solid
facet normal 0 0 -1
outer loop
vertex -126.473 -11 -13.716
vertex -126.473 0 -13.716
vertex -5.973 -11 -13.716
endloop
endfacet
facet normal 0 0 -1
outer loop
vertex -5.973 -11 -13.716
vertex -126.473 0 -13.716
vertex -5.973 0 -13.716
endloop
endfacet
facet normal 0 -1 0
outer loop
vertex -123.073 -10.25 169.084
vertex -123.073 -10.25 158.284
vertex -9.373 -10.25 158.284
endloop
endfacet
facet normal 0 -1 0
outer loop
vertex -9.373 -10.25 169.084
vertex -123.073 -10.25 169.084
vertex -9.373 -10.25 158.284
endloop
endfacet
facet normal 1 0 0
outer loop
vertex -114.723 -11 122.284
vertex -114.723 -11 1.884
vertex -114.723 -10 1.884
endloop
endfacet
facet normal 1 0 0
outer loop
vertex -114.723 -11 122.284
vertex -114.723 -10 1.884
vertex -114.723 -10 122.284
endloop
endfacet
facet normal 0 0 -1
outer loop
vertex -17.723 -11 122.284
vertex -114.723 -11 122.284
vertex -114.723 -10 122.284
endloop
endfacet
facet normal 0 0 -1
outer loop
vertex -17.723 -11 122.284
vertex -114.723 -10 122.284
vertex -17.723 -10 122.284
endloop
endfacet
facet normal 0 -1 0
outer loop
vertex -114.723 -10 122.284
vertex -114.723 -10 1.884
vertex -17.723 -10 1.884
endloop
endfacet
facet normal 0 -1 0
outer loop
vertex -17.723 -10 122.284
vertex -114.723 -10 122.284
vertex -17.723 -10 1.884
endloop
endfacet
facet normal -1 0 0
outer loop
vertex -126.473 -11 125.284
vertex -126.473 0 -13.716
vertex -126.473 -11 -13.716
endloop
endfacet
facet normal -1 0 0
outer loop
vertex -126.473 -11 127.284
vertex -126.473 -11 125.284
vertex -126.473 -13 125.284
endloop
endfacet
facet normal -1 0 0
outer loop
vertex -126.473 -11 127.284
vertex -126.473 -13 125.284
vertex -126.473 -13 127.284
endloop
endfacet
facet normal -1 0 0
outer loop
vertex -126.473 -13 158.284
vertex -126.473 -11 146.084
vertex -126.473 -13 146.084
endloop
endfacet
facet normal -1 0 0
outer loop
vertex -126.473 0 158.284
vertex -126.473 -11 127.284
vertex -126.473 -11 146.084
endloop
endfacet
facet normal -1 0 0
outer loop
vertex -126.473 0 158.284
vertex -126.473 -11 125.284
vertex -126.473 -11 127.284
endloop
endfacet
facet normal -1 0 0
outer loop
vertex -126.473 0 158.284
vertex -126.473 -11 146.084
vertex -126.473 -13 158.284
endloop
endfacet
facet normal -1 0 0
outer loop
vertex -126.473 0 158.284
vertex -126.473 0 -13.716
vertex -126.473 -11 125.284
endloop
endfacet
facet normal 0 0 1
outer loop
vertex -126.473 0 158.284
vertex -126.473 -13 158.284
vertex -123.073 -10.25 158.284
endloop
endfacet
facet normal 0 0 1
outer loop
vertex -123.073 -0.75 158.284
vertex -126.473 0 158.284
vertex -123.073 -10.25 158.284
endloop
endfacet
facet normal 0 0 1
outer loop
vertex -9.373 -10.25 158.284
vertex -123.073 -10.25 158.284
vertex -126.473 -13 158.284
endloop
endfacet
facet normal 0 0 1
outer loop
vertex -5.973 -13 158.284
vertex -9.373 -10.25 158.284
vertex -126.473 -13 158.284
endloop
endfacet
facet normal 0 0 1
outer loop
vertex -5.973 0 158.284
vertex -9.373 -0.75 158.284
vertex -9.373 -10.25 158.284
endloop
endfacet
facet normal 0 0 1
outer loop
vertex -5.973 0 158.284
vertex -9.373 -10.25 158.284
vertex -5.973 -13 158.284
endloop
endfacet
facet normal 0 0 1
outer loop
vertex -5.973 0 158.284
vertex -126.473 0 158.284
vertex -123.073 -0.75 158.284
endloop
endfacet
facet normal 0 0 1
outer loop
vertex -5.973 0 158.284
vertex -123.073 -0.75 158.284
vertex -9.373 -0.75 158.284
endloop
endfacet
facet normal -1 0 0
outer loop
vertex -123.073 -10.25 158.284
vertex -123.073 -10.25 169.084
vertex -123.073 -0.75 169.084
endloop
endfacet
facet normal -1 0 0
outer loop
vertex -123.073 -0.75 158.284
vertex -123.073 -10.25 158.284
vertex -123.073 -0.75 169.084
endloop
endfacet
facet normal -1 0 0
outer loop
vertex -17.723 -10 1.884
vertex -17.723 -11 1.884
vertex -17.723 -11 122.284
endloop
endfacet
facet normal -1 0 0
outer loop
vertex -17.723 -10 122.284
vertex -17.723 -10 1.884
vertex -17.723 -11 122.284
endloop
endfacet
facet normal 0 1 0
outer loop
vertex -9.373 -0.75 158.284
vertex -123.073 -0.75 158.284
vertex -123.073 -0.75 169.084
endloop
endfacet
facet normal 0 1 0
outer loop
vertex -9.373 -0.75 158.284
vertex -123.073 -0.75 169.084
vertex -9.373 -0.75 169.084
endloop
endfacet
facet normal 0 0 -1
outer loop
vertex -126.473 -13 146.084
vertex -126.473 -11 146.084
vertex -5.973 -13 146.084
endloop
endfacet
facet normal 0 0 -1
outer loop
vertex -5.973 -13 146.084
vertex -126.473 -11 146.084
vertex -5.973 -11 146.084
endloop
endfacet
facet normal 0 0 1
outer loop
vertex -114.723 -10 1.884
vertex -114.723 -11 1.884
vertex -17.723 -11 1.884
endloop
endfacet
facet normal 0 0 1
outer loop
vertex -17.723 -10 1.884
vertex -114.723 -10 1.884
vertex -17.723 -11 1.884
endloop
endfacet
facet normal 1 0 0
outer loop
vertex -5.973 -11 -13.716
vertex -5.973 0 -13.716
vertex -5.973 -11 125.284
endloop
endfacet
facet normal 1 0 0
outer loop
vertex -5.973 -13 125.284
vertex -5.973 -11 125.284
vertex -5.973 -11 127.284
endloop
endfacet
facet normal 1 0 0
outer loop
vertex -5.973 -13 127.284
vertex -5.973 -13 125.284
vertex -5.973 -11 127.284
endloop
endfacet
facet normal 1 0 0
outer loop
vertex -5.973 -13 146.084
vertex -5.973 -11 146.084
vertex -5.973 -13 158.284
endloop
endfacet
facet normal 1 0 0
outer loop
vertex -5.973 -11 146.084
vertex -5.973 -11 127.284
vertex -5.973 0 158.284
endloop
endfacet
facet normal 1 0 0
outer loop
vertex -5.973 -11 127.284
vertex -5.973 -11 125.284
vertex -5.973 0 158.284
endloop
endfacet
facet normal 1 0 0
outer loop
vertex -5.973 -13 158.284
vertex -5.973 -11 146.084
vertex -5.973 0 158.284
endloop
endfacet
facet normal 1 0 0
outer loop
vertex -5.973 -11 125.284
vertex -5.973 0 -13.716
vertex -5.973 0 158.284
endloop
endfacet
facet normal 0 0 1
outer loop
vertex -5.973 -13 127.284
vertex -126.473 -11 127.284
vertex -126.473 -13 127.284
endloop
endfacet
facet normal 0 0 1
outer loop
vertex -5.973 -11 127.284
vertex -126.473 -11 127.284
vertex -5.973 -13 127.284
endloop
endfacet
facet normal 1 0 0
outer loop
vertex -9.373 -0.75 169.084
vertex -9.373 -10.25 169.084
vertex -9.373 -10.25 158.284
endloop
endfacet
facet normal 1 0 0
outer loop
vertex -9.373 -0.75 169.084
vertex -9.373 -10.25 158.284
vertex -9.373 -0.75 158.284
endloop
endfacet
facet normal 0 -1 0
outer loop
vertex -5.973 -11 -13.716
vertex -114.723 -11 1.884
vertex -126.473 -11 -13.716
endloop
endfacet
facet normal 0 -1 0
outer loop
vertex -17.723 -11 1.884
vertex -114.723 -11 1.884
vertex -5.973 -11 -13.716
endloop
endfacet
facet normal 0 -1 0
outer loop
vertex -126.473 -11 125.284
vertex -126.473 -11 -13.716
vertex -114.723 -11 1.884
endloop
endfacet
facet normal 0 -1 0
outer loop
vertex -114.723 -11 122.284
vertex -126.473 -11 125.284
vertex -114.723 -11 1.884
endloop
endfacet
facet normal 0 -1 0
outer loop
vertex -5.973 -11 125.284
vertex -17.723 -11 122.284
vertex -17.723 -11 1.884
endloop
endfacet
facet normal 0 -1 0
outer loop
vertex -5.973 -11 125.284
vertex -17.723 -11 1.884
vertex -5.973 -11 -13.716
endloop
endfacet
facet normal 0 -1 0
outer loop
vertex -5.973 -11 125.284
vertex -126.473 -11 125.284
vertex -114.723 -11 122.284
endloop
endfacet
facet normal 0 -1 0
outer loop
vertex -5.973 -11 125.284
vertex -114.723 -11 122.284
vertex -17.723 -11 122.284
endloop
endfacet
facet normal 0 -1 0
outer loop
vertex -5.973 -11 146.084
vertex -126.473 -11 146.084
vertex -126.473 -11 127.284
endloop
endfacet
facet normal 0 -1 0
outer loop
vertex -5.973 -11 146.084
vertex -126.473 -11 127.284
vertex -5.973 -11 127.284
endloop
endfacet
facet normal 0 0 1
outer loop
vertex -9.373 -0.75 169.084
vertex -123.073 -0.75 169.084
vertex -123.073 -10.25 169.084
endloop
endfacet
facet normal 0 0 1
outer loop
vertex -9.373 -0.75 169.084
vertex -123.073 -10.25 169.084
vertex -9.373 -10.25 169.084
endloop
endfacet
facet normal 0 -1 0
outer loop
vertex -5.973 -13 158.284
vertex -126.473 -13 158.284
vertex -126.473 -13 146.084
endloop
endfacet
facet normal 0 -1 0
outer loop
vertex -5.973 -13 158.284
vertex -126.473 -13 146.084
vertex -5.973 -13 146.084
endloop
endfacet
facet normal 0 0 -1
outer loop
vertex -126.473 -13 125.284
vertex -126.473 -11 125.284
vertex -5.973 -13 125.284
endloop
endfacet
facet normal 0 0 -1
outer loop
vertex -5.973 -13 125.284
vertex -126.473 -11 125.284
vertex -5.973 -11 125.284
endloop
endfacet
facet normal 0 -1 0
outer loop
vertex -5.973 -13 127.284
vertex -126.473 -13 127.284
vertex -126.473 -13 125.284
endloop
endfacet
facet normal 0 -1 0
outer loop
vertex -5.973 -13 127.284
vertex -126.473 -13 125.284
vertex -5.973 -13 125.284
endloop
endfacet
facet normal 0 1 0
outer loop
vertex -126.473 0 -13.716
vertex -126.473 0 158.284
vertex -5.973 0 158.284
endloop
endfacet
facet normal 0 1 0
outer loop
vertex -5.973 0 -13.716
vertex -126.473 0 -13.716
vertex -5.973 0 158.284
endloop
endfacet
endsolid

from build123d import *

# Parameters (mm, degrees)
F0_W     = 120.5
F0_H     = 172
F1_DEPTH = 11
F2_W     = 97
F2_H     = 120.4
F3_DEPTH = 1
F4_W     = 120.5
F4_H     = 2
F5_DEPTH = 2
F6_W     = 113.7
F6_H     = 9.5
F7_DEPTH = 10.8
F8_W     = 120.5
F8_H     = 12.2
F9_DEPTH = 2


with BuildPart() as f1:
    # F0 (on Front) → F1 (new body)
    with BuildSketch(Plane.XZ):
        with Locations((-66.222898, 72.284041)):
            Rectangle(F0_W, F0_H)
    extrude(amount=F1_DEPTH)

    # F2 (on face) → F3 (cut)
    with BuildSketch(Plane.XZ.offset(11)):
        with Locations((-66.222898, 62.084041)):
            Rectangle(F2_W, F2_H)
    extrude(amount=-F3_DEPTH, mode=Mode.SUBTRACT)

    # F4 (on face) → F5 (join)
    with BuildSketch(Plane.XZ.offset(11)):
        with Locations((-66.222898, 126.284041)):
            Rectangle(F4_W, F4_H)
    extrude(amount=F5_DEPTH)

    # F6 (on face) → F7 (join)
    with BuildSketch(Plane.XY.offset(158.284041)):
        with Locations((-66.222898, -5.5)):
            Rectangle(F6_W, F6_H)
    extrude(amount=F7_DEPTH)

    # F8 (on face) → F9 (join)
    with BuildSketch(Plane.XZ.offset(11)):
        with Locations((-66.222898, 152.184041)):
            Rectangle(F8_W, F8_H)
    extrude(amount=F9_DEPTH)


solid = f1.part
